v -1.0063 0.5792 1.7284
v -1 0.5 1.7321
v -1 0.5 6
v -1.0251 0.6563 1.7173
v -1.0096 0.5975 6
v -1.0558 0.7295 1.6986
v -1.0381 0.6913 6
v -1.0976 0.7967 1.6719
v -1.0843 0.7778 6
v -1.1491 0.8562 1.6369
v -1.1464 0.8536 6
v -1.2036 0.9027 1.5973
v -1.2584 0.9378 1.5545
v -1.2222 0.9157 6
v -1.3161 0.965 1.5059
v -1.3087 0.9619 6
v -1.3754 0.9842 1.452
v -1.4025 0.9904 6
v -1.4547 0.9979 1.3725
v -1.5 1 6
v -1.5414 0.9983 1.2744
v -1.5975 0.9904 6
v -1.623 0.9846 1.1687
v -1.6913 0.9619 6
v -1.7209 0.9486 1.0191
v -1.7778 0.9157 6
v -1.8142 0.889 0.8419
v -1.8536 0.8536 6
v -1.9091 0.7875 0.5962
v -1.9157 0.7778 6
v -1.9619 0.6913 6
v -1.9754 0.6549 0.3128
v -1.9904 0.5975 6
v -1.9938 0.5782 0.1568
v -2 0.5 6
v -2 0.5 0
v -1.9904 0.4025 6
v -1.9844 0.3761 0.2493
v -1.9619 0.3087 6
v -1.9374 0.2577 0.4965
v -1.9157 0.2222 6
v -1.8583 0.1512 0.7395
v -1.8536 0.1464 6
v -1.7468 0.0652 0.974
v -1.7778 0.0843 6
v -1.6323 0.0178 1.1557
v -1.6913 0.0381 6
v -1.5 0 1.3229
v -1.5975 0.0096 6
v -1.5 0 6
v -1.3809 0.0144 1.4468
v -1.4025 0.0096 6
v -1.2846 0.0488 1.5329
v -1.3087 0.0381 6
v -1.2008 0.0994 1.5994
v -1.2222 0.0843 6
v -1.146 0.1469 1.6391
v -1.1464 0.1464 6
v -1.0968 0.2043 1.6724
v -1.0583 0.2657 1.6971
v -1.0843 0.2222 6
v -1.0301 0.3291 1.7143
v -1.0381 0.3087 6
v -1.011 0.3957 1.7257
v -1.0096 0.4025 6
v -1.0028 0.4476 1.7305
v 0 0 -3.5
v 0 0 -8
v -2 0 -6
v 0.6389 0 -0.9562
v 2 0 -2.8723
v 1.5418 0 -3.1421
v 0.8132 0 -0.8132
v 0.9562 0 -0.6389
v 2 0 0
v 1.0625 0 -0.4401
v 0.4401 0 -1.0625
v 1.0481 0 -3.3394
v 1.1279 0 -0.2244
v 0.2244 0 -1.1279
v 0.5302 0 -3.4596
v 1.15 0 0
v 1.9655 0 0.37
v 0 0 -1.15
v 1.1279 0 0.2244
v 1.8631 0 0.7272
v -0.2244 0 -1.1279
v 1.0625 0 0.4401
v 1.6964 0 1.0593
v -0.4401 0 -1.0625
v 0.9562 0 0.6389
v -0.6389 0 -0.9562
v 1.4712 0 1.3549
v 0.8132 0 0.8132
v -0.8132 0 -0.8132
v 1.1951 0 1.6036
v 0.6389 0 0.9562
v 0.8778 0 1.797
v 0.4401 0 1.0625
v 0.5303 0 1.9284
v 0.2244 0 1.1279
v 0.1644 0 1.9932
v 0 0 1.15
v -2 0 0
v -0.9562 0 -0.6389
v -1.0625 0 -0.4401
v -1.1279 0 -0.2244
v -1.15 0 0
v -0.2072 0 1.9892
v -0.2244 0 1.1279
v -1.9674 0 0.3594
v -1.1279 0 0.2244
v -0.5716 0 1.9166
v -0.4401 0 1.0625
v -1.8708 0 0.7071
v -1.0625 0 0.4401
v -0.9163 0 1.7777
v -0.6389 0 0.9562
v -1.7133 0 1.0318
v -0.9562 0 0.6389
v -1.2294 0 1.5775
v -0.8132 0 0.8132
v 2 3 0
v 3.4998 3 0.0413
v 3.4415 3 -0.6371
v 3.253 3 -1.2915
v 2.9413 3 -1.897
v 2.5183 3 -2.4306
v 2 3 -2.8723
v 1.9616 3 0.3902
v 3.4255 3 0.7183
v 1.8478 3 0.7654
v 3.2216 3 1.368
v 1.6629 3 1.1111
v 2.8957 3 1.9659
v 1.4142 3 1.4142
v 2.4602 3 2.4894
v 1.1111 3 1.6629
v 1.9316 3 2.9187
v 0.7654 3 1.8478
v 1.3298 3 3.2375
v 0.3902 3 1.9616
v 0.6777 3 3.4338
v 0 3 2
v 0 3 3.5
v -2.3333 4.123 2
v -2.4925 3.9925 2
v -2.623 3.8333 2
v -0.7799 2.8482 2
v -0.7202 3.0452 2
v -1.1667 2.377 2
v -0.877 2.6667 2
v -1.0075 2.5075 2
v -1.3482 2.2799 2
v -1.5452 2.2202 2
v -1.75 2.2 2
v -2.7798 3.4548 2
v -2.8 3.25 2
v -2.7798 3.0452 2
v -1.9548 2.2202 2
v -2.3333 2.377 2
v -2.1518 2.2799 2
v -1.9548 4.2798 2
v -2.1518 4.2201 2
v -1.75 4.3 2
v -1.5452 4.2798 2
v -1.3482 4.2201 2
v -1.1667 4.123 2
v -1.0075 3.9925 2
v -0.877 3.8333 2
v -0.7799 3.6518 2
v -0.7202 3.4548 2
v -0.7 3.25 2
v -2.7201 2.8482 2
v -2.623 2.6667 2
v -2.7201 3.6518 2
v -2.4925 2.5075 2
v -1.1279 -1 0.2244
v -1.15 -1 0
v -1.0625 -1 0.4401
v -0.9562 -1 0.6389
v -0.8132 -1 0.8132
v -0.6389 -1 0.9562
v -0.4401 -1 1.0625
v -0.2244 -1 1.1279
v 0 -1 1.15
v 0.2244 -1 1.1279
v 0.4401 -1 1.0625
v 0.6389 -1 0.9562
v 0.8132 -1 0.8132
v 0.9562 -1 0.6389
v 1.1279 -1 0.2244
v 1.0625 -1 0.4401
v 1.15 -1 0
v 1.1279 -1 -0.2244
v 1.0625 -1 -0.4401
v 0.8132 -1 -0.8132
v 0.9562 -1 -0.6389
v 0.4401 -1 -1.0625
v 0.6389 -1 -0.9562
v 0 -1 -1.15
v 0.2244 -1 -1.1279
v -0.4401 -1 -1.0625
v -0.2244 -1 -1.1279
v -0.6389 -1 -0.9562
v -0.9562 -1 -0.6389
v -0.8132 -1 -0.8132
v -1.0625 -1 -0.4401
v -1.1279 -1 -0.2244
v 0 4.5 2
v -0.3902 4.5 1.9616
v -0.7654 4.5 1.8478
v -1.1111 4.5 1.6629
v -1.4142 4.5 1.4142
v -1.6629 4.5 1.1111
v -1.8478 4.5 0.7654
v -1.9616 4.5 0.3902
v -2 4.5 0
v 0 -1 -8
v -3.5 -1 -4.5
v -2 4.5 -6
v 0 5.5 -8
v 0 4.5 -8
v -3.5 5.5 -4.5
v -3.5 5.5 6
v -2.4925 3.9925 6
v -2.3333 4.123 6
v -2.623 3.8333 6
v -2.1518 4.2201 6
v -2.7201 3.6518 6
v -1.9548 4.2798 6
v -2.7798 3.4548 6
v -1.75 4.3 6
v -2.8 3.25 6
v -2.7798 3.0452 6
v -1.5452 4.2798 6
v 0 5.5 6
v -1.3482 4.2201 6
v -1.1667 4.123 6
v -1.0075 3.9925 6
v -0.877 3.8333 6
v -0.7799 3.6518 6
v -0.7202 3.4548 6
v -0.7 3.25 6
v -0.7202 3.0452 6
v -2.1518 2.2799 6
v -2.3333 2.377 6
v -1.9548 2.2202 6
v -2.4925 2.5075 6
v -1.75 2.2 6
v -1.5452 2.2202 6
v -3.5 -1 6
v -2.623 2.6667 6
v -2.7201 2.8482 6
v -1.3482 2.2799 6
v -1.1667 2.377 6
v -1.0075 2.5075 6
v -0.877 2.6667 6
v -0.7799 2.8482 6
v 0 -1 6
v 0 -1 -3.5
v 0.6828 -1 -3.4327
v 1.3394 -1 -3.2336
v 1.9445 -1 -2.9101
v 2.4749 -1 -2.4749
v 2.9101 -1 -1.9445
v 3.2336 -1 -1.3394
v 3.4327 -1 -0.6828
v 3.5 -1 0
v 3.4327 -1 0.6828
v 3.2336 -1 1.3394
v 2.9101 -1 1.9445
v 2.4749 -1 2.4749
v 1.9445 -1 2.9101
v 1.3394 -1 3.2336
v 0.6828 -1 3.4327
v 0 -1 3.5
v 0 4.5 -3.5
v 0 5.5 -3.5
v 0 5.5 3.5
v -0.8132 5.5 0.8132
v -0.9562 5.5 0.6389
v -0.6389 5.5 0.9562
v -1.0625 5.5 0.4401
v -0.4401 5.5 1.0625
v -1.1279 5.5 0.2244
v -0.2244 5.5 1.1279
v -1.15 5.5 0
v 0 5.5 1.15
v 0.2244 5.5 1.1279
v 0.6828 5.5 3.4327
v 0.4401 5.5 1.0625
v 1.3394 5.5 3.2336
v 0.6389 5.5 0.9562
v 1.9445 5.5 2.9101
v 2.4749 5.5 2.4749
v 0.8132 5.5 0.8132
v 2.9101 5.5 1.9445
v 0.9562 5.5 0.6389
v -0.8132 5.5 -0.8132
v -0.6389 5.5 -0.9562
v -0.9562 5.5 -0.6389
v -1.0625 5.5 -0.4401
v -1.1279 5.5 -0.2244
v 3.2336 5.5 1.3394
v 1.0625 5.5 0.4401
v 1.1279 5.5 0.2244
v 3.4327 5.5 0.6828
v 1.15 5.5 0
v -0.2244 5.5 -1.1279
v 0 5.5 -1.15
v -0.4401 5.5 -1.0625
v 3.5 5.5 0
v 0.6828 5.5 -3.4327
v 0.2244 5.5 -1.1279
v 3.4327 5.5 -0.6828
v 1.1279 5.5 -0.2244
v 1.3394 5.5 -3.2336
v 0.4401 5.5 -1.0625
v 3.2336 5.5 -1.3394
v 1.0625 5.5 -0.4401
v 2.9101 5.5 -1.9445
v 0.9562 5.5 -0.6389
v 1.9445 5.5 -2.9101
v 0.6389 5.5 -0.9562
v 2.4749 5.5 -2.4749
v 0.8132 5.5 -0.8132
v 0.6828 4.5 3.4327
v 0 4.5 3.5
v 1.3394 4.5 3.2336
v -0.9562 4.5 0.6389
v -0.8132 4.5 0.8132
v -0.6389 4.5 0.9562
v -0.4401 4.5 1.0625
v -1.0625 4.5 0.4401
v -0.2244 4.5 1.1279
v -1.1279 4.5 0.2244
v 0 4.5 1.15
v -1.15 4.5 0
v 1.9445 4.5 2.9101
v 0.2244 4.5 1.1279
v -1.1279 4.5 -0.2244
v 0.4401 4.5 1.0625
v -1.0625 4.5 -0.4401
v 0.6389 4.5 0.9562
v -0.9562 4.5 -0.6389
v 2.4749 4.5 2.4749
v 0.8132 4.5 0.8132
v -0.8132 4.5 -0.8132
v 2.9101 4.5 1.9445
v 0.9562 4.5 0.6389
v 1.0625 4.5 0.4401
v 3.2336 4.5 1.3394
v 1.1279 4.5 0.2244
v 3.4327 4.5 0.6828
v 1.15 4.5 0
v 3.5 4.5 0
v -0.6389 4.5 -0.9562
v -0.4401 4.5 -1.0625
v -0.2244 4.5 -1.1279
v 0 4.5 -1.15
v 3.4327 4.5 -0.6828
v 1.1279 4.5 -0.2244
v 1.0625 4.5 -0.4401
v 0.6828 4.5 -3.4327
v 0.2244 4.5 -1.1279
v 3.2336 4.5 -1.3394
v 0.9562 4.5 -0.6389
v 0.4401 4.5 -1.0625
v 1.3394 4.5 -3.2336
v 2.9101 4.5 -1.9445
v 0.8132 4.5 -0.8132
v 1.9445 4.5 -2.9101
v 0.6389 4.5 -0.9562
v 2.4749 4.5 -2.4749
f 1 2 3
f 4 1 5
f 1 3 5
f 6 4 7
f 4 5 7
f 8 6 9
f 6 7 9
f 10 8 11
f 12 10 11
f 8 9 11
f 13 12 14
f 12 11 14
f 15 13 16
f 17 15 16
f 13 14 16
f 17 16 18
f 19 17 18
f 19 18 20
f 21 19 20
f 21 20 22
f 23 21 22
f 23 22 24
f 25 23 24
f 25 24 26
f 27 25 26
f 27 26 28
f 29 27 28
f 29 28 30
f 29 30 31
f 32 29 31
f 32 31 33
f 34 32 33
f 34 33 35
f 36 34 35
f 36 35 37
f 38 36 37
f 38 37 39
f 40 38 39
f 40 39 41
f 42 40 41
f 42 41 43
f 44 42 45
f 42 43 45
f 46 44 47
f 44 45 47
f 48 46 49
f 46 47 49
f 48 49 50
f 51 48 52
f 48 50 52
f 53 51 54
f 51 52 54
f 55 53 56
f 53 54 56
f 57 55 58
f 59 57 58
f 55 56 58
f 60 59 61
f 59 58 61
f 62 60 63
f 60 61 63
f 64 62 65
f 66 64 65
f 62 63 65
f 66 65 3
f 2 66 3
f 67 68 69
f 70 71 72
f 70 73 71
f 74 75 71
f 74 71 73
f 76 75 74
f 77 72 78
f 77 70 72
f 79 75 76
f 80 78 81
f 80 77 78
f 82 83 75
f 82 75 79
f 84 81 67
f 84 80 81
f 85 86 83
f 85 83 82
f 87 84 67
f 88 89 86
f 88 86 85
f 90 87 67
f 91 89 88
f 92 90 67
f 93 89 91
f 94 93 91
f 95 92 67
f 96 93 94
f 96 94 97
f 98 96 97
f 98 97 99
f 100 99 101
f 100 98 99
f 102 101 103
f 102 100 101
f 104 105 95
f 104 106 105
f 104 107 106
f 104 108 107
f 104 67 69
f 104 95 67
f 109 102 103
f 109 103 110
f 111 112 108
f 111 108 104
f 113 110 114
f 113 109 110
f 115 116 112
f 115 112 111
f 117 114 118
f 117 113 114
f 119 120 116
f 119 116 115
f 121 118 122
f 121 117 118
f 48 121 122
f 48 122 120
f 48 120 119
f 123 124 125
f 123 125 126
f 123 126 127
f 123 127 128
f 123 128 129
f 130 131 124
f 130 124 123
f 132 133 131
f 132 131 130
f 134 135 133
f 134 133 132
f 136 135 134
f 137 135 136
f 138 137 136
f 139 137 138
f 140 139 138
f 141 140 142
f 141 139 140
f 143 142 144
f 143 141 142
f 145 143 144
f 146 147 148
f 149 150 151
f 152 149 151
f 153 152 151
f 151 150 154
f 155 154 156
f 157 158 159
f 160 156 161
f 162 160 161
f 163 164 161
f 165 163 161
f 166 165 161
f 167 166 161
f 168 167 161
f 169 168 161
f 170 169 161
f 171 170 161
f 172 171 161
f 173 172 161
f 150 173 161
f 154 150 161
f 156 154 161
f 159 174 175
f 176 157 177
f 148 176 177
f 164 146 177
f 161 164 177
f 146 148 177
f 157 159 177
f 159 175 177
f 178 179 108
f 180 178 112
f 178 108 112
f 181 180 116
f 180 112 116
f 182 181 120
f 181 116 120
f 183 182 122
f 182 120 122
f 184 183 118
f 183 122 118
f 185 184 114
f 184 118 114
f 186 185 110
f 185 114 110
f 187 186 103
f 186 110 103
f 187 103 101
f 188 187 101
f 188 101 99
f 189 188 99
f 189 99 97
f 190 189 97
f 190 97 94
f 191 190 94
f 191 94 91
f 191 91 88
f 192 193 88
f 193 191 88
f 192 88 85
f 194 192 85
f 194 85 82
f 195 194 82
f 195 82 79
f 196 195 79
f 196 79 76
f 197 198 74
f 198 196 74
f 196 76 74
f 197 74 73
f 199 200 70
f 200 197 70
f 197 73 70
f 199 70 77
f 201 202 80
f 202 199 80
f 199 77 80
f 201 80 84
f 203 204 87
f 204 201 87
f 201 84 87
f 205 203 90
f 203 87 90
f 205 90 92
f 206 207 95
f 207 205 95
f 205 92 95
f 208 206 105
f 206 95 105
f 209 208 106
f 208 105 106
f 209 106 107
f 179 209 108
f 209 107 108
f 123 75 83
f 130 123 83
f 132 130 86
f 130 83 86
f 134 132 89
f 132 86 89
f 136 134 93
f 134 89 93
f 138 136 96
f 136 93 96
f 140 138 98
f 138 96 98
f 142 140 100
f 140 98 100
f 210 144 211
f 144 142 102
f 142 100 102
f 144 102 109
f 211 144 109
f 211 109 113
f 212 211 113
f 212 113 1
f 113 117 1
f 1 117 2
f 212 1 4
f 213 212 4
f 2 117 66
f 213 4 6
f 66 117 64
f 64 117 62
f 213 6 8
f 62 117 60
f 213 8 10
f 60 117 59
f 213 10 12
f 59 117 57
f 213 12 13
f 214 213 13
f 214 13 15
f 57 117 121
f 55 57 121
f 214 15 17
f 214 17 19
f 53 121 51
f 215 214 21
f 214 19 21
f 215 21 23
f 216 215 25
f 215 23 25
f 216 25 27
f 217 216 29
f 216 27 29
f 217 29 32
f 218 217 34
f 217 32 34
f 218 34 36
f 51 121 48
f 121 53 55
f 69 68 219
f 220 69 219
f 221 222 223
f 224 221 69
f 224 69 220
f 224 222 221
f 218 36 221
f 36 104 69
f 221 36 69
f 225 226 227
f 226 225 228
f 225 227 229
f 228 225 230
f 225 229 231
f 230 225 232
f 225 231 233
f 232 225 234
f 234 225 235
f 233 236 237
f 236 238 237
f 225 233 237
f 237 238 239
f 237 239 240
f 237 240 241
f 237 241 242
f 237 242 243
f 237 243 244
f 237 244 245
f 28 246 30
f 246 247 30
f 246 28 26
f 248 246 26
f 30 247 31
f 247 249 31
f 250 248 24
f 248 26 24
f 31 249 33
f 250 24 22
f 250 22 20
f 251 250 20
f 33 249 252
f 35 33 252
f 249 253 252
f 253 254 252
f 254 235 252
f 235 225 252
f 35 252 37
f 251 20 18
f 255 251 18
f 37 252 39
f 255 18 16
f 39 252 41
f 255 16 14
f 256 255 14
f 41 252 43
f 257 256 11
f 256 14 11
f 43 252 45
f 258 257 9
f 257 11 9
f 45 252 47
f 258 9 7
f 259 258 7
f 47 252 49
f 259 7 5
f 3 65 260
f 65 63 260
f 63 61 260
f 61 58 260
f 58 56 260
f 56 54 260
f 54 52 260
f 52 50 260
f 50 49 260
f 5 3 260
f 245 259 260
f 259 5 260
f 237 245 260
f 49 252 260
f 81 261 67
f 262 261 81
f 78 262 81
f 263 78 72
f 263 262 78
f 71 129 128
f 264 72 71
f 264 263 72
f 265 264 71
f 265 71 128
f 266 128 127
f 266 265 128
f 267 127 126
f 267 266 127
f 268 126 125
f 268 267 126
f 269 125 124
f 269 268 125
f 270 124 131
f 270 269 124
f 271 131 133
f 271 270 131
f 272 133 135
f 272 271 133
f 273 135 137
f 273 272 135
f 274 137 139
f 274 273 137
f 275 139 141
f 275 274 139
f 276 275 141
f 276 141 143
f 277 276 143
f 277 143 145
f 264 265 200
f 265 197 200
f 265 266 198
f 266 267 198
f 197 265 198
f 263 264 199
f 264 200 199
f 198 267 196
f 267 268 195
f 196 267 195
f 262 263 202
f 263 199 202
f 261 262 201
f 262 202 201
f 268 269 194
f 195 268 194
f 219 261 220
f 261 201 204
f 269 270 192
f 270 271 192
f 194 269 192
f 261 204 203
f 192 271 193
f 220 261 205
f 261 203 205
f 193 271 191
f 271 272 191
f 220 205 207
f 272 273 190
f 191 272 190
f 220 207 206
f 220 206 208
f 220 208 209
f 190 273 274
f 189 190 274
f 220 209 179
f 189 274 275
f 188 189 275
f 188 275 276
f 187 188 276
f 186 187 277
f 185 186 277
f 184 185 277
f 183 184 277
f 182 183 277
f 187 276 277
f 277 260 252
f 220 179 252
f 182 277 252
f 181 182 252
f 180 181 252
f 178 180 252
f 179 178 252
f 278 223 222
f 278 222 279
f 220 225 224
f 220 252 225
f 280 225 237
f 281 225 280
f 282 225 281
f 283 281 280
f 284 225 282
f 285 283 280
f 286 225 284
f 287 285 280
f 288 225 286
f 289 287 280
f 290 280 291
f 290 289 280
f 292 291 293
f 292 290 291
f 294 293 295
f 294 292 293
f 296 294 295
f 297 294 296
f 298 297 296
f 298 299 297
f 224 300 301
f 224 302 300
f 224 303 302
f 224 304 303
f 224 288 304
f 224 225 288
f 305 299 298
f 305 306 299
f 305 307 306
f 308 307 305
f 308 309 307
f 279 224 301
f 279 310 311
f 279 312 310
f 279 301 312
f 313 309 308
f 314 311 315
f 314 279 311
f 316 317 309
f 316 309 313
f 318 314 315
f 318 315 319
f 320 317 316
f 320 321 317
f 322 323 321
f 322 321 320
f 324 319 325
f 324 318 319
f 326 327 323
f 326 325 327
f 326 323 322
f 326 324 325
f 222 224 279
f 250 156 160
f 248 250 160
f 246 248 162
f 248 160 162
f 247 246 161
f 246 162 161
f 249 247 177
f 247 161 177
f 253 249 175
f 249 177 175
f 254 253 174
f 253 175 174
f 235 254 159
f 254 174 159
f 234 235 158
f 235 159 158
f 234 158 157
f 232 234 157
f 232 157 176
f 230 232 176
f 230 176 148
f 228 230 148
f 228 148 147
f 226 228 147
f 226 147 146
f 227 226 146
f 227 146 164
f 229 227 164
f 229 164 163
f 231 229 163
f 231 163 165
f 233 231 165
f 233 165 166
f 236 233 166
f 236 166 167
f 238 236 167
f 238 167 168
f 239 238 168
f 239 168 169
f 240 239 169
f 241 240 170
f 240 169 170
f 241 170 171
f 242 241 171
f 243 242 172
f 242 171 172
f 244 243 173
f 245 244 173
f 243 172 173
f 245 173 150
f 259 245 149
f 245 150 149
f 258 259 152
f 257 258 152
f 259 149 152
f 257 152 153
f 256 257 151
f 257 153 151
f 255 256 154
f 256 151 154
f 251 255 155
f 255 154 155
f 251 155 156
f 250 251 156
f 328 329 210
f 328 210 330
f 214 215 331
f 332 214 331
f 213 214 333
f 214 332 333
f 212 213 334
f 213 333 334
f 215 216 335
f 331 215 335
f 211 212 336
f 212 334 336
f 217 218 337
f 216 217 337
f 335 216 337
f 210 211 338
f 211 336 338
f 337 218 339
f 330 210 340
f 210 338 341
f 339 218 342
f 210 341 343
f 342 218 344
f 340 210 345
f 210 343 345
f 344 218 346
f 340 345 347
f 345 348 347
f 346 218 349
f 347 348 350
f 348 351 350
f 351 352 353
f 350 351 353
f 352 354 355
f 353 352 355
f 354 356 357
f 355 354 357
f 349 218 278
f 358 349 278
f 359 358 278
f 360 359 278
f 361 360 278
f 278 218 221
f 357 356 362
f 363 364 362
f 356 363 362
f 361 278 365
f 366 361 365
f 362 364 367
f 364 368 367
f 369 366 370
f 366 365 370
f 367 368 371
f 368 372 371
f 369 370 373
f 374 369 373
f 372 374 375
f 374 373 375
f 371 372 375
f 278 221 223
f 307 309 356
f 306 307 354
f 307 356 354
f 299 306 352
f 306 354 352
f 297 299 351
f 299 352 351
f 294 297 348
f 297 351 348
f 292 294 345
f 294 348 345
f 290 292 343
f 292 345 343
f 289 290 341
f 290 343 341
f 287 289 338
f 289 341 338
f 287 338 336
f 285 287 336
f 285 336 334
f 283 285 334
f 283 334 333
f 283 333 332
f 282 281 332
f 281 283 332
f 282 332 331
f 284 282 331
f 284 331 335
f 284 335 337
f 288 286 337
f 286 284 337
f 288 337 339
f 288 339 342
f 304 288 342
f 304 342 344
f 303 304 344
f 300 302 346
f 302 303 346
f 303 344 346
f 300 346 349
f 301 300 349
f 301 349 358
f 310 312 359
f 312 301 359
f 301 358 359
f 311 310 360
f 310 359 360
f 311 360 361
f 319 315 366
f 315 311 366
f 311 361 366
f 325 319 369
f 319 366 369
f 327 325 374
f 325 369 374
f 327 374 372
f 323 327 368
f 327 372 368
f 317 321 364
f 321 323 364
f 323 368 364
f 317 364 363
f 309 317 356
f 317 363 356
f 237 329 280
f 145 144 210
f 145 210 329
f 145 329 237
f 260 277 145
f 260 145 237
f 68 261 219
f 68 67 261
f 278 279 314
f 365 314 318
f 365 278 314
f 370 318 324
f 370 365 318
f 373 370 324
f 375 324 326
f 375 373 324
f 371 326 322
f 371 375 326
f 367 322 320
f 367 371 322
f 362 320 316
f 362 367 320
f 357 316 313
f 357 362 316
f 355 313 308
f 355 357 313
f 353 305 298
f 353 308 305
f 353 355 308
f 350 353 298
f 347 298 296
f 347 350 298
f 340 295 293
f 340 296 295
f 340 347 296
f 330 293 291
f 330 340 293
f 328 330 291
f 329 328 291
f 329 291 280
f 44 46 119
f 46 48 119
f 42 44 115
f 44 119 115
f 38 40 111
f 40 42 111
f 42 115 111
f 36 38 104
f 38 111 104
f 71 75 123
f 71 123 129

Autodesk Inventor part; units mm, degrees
ref_plane "YZ Plane" through (0, 0, 0) normal (1, 0, 0) x (0, 1, 0)
ref_plane "XZ Plane" through (0, 0, 0) normal (0, 1, 0) x (-1, 0, 0)
ref_plane "XY Plane" through (0, 0, 0) normal (0, 0, 1) x (1, 0, 0)
sketch "スケッチ1" plane through (0, 0, 0) normal (0, 1, 0) x (-1, 0, 0)
  circle A0 centre (0, 0) radius 1.15
  circle A1 centre (0, 0) radius 2
  circle A2 centre (0, 0) radius 3.5
  line L0 (0, 0) -> (0, 3.5)
  line L1 (2, 0) -> (-2, 0)
  line L2 (2, 0) -> (2, -2.8723)
  line L3 (-2, 0) -> (-2, -2.8723)
  line L4 (0, 2) -> (3.5, 2)
  line L5 (3.5, 2) -> (3.5, 6)
  line L6 (3.5, 6) -> (0, 6)
  line L7 (0, 6) -> (0, 2)
  line L8 (0, 6) -> (3.5, 6)
  line L9 (3.5, 6) -> (3.5, 0)
  line L10 (3.5, 0) -> (0, 0)
  line L11 (0, 0) -> (0, 6)
  line L12 (0, 0) -> (0, -8)
  line L13 (0, 0) -> (3.5, 0)
  line L14 (3.5, 0) -> (3.5, -8)
  line L15 (3.5, -8) -> (0, -8)
  line L16 (0, -8) -> (0, 0)
  line L17 (2, -2.8723) -> (2, -8)
  line L18 (0, -8) -> (3.5, -4.5)
  line L19 (0, -8) -> (4.9497, -8) construction
  point P0 (2, -6)
  point P1 (0, -3.5)
  dimension "d0" = 2.3
  dimension "d1" = 4
  dimension "d2" = 7
  dimension "d3" = 3.5
  dimension "d4" = 4
  dimension "d5" = 8
  dimension "d6" = 45
extrude "押し出し1" add sketch "スケッチ1" along normal blind 3 contours A1 L3 A2 L0
extrude "押し出し2" add sketch "スケッチ1" along normal blind 4.5 contours L10 A2 L2 | A1 L4 A2 L10 | L0 A2 L4 | A2 L14 L18 L17 | A2 L4 L9 | L7 L6 L5 L4 A2
extrude "押し出し3" add sketch "スケッチ1" against normal blind 1 contours L1 A1 L12 A0 | A0 L0 A1 L1 | A0 L1 A1 L0 | L12 A1 L1 A0 | L2 A2 L12 A1 | L10 A2 L2 | A1 L4 A2 L10 | A1 L3 A2 L0 | L0 A2 L4 | L12 A2 L3 A1 | L17 L18 L12 A2 | A2 L14 L18 L17 | A2 L4 L9 | L7 L6 L5 L4 A2
sketch "スケッチ2" plane through (0, 4.5, 0) normal (0, 1, 0) x (1, 0, 0)
  circle A0 centre (0, 0) radius 1.15
  circle A1 centre (0, 0) radius 2
  circle A2 centre (0, 0) radius 3.5
  line L0 (0, -2) -> (0, -3.5) projected
  line L1 (-3.5, 4.5) -> (-3.5, -6) projected
  line L2 (0, -2) -> (-3.5, -2)
  line L3 (-3.5, -2) -> (-3.5, -6)
  line L4 (-3.5, -6) -> (0, -6)
  line L5 (0, -6) -> (0, -2)
  line L6 (0, -2) -> (-3.5, -2)
  line L7 (-3.5, -2) -> (-3.5, 8)
  line L8 (-3.5, 8) -> (0, 8)
  line L9 (0, 8) -> (0, -2)
  line L10 (0, 0) -> (-2, 0)
  line L11 (-2, 0) -> (-2, 8)
  line L12 (-2, 8) -> (0, 8)
  line L13 (0, 8) -> (0, 0)
  line L14 (0, 8) -> (-3.5, 4.5)
  line L15 (0, 8) -> (4.9497, 8) construction
  point P0 (0, 3.5)
  dimension "d14" = 4
  dimension "d15" = 7
  dimension "d13" = 2.3
  dimension "d16" = 3.5
  dimension "d17" = 4
  dimension "d18" = 3.5
  dimension "d19" = 10
  dimension "d20" = 2
  dimension "d21" = 8
  dimension "d22" = 135
extrude "押し出し4" add sketch "スケッチ2" along normal blind 1 contours A0 L9 A1 | A0 L10 A1 L9 | L9 A1 L10 A0 | L9 A2 L0 A1 | A1 L11 A2 L9 | L2 A2 L11 A1 | L0 A2 L2 | A2 L11 L14 L9 | L5 L4 L1 L2 A2 | L2 L1 A2 | A2 L1 L14 L11
sketch "スケッチ3" plane through (-3.5, -1, 6) normal (0, 0, 1) x (1, 0, 0)
  line L0 (0, 0) -> (0, 6.5) projected
  line L1 (0, 0) -> (3.5, 0)
  line L2 (3.5, 0) -> (3.5, 1)
  line L3 (3.5, 1) -> (0, 1)
  line L4 (0, 1) -> (0, 0)
  line L5 (3.5, 1) -> (2, 1)
  line L6 (2, 1) -> (2, 1.5)
  line L7 (2, 1.5) -> (3.5, 1.5)
  line L8 (3.5, 1.5) -> (3.5, 1)
  circle A0 centre (2, 1.5) radius 0.5
  line L9 (0, 6.5) -> (1.75, 6.5)
  line L10 (1.75, 6.5) -> (1.75, 4.25)
  line L11 (1.75, 4.25) -> (0, 4.25)
  line L12 (0, 4.25) -> (0, 6.5)
  dimension "d25" = 3.5
  dimension "d26" = 1
  dimension "d27" = 1.5
  dimension "d28" = 0.5
  dimension "d29" = 1.75
  dimension "d30" = 2.25
extrude "押し出し5" cut sketch "スケッチ3" against normal blind 6 contours A0 L7 L6 | L6 L7 A0
hole "穴1" at (-1.75, 3.25, 6) direction (0, 0, -1) diameter 2.1 depth 4
properties part number "rod6.0"
